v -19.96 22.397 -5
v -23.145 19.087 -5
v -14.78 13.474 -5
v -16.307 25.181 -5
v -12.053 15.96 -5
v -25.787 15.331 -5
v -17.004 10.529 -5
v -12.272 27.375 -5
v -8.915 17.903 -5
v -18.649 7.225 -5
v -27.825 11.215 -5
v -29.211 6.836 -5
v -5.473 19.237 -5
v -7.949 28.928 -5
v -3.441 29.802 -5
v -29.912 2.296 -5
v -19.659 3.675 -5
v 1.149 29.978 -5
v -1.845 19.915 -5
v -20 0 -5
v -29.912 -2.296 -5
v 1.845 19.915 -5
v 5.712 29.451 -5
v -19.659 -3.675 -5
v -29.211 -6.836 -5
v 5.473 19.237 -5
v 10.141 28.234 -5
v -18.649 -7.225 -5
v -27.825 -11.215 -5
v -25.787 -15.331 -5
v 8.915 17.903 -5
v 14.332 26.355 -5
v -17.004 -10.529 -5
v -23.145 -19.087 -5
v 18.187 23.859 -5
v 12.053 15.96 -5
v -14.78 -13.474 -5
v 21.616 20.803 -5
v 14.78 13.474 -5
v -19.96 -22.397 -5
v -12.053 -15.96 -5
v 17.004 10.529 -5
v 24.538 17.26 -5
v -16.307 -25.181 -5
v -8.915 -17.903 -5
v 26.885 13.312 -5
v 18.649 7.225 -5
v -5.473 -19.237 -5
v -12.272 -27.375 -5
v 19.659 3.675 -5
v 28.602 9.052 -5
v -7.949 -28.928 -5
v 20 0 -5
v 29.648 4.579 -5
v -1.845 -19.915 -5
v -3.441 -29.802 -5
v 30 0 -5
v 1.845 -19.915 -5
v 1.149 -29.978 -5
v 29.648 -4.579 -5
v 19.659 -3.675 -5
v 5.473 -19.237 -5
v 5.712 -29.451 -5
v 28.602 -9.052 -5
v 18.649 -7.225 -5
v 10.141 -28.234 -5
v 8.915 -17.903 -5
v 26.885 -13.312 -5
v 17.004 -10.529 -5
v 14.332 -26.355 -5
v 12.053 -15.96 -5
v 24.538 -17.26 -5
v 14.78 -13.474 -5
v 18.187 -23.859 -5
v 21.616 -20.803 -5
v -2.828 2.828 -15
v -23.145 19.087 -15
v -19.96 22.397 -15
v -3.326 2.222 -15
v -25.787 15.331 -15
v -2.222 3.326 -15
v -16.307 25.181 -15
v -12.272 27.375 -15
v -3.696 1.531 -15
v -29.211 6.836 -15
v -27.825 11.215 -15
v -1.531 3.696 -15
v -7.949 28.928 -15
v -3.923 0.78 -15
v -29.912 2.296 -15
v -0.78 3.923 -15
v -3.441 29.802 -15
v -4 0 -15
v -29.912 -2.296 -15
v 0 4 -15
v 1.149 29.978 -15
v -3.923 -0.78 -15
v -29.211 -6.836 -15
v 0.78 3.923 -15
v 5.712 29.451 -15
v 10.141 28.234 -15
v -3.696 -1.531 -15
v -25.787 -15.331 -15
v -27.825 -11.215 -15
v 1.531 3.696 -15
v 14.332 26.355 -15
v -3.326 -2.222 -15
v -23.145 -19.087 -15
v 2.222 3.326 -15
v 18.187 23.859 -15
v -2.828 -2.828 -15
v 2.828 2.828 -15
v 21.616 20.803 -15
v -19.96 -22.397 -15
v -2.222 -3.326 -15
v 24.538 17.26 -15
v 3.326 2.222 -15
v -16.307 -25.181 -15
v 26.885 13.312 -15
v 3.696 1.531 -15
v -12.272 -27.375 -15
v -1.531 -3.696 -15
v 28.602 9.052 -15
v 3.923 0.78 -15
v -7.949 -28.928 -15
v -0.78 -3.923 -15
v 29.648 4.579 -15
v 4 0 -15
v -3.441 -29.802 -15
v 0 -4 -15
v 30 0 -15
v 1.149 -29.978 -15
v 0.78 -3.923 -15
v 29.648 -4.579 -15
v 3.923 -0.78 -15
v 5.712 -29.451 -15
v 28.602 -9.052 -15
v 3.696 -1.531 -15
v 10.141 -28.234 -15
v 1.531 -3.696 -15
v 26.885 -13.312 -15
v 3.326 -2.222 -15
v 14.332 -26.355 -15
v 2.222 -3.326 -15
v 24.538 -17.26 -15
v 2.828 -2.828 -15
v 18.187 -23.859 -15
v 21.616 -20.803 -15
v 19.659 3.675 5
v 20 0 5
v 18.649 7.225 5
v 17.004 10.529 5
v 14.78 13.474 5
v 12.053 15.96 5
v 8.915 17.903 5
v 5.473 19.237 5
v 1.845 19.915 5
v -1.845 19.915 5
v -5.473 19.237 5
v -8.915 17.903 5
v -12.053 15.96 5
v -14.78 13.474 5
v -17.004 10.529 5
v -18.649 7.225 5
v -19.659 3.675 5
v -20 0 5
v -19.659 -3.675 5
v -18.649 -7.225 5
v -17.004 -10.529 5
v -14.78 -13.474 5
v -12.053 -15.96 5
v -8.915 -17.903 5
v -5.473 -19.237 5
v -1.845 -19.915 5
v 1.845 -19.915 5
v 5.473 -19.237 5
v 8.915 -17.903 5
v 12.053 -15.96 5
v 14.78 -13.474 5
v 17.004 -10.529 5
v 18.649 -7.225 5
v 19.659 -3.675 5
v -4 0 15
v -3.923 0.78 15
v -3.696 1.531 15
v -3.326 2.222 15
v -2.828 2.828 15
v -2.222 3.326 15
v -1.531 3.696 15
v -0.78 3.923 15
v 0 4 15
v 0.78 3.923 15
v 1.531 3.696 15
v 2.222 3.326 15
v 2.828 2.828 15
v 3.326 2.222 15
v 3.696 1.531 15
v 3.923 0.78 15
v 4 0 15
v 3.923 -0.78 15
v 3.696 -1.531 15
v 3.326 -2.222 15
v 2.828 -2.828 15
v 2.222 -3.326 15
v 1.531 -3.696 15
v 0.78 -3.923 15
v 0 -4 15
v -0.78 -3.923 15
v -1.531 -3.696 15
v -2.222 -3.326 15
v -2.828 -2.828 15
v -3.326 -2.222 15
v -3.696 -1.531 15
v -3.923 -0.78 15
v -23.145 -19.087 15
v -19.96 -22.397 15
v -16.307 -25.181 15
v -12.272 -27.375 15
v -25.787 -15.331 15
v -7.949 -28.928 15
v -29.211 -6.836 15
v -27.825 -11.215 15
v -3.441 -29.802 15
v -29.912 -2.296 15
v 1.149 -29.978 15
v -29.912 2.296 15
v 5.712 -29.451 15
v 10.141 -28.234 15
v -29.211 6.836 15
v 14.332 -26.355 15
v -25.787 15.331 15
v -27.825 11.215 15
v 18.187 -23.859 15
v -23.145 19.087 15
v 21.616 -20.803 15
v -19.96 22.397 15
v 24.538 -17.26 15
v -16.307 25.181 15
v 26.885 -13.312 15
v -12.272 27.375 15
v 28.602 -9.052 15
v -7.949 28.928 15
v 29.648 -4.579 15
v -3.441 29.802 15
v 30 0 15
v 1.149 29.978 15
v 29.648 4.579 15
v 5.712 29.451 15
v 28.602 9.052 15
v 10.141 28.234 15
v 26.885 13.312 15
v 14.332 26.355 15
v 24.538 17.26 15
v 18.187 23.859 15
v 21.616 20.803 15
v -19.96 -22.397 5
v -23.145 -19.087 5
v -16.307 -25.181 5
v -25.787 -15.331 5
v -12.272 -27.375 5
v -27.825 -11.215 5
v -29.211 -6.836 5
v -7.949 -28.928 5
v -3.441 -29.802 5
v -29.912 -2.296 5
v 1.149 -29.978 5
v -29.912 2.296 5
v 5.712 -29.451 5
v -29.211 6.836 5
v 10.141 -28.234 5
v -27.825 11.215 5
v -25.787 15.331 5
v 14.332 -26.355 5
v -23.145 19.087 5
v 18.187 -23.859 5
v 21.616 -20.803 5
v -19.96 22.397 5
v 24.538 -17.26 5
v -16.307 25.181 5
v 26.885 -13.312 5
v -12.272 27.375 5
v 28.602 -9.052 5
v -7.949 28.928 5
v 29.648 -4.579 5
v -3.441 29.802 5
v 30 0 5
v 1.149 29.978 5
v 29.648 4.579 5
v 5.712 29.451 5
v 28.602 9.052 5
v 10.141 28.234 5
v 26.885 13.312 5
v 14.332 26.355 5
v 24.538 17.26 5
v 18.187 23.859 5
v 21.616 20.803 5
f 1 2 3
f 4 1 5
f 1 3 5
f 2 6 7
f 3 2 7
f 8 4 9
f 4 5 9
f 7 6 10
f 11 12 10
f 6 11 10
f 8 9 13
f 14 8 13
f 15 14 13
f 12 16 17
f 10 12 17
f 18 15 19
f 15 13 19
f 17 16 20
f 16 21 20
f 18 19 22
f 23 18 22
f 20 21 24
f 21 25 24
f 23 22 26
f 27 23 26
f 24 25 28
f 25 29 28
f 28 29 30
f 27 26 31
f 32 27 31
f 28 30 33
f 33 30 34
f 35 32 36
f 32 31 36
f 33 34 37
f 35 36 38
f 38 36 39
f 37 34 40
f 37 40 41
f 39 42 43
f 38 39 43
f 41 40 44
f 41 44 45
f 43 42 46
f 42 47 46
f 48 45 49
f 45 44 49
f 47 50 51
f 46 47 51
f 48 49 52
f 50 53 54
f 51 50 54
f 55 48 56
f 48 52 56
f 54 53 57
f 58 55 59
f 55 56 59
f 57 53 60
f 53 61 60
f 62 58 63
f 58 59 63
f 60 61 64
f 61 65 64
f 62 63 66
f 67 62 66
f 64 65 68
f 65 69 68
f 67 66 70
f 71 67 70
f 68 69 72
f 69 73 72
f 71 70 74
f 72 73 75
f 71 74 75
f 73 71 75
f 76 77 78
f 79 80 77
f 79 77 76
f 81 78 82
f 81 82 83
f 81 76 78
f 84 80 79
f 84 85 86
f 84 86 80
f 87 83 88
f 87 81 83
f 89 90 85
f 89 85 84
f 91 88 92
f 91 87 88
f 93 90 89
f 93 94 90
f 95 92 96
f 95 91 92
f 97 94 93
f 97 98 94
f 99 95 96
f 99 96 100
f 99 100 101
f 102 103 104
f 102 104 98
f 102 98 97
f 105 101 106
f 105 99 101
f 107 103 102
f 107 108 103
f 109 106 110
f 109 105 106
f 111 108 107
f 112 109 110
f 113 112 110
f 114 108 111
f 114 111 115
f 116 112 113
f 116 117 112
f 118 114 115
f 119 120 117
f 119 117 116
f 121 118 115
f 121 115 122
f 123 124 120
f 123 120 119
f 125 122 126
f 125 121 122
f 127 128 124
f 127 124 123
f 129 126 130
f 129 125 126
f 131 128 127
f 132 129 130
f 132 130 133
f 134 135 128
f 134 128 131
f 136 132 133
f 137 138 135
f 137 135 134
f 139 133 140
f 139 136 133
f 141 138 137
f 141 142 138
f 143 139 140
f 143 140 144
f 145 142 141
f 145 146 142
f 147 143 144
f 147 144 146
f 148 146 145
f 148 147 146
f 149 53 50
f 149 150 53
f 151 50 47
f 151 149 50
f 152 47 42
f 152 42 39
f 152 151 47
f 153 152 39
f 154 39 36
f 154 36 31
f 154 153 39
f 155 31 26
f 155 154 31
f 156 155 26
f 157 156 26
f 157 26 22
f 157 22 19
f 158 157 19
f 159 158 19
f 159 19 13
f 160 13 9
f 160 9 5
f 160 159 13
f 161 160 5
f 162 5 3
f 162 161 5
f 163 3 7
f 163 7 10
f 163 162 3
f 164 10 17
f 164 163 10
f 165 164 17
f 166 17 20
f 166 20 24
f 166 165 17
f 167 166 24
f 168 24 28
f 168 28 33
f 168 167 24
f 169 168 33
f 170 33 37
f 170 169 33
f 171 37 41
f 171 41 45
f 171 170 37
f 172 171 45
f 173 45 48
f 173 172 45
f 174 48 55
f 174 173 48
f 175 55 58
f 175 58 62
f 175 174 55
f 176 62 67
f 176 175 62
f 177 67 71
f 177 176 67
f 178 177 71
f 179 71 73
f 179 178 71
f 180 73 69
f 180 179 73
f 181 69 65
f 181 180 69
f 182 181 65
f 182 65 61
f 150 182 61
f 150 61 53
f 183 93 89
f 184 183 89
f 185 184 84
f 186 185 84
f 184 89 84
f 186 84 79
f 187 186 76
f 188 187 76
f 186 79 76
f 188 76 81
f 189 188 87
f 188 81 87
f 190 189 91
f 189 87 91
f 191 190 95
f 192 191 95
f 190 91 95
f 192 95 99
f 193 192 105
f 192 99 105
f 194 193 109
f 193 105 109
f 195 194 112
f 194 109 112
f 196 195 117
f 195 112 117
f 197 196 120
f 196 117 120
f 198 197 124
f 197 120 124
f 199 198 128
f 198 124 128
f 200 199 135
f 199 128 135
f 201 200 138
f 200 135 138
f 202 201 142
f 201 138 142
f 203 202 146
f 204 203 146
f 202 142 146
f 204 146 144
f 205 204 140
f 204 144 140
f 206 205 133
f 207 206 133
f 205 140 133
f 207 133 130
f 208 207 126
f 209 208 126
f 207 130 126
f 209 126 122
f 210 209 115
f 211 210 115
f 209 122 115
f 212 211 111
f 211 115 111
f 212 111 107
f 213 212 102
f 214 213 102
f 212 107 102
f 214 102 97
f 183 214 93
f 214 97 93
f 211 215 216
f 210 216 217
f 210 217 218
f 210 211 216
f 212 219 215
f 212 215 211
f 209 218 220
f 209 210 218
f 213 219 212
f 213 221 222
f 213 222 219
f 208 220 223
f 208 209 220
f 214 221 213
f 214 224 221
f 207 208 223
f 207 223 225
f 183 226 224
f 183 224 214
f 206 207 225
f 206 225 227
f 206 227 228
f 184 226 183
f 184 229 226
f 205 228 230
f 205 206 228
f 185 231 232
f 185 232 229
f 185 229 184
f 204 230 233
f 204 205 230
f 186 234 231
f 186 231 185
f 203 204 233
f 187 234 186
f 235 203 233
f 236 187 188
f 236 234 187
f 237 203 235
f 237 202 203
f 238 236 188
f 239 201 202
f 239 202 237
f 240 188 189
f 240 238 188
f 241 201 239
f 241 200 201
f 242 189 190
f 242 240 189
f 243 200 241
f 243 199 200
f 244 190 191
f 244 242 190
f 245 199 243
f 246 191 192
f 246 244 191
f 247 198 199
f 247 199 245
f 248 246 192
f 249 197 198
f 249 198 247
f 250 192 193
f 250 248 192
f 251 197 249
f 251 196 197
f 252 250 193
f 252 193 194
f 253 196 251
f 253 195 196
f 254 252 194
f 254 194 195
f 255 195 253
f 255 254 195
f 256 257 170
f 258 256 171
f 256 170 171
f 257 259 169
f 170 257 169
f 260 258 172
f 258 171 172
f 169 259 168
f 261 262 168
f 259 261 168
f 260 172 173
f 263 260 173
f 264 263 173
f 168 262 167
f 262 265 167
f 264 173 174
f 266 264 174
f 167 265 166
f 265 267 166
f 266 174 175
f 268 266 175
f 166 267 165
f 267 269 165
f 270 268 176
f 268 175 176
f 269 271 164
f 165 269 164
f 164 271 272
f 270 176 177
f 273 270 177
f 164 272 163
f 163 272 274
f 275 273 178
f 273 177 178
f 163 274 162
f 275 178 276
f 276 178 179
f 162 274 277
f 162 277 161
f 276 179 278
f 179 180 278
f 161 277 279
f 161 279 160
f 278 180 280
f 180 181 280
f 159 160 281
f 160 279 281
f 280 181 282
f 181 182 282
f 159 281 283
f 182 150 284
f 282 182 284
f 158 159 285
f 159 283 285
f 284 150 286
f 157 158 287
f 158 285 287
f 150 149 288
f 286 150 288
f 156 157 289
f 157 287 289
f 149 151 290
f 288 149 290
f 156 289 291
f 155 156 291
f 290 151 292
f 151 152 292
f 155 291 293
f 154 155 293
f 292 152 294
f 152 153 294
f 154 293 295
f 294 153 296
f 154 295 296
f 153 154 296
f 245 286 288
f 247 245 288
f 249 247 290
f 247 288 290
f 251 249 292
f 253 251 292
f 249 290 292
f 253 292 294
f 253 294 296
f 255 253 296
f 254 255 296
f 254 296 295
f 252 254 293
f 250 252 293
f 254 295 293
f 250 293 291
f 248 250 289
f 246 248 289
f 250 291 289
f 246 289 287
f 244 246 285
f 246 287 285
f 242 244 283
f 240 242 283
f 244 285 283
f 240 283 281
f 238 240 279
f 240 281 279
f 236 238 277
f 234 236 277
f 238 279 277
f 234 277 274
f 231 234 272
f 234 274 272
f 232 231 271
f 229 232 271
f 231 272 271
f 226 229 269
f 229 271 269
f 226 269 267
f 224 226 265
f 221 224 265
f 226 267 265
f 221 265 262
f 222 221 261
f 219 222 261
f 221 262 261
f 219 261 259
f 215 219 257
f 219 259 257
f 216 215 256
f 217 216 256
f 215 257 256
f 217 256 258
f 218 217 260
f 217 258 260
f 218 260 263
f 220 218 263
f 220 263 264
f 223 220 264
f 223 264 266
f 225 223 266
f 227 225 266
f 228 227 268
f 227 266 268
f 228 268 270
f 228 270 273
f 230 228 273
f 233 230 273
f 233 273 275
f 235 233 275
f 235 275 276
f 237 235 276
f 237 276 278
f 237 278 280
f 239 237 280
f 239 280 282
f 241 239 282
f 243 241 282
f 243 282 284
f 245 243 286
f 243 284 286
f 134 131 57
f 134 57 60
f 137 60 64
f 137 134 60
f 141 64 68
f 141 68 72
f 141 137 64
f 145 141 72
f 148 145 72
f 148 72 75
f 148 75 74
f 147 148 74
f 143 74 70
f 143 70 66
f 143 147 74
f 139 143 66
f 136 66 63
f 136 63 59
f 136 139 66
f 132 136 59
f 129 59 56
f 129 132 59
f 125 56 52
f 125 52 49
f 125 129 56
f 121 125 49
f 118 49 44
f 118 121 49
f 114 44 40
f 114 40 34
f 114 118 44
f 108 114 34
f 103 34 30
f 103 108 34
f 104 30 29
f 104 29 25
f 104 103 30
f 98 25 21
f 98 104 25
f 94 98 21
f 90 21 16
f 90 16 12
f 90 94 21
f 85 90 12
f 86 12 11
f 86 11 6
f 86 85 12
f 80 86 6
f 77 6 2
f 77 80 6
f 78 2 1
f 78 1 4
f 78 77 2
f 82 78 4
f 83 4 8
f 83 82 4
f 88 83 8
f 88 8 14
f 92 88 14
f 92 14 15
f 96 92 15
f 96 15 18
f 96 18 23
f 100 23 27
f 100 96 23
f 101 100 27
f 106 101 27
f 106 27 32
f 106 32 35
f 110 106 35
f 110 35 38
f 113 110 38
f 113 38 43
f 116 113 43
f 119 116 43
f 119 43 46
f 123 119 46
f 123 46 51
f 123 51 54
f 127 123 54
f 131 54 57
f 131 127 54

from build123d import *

# Parameters (mm, degrees)
SKETCH1_R          = 20
EXTRUDE1_DEPTH     = 5
SKETCH2_R          = 30
EXTRUDE2_DEPTH     = 10
EXTRUDE3_START     = 10
SKETCH3_R          = 30
EXTRUDE3_DEPTH     = 10
SKETCH4_R          = 4
CUT_EXTRUDE1_DEPTH = 30


with BuildPart() as part:
    # Sketch1 → Extrude1 (new, symmetric)
    with BuildSketch(Plane.XY):
        Circle(SKETCH1_R)
    extrude(amount=EXTRUDE1_DEPTH, both=True)

    # Sketch2 → Extrude2 (add)
    with BuildSketch(Plane.XY.offset(5)):
        Circle(SKETCH2_R)
    extrude(amount=EXTRUDE2_DEPTH)

    # Sketch3 → Extrude3 (add)
    with BuildSketch(Plane(origin=(0, 0, -5), x_dir=(-1, 0, 0), z_dir=(0, 0, -1)).offset(EXTRUDE3_START)):
        with Locations(Location((0, 0, 0), (0, 0, 180))):
            Circle(SKETCH3_R)
    extrude(amount=-EXTRUDE3_DEPTH)

    # Sketch4 → Cut-Extrude1 (cut)
    with BuildSketch(Plane(origin=(0, 0, -15), x_dir=(-1, 0, 0), z_dir=(0, 0, -1))):
        Circle(SKETCH4_R)
    extrude(amount=-CUT_EXTRUDE1_DEPTH, mode=Mode.SUBTRACT)


solid = part.part
